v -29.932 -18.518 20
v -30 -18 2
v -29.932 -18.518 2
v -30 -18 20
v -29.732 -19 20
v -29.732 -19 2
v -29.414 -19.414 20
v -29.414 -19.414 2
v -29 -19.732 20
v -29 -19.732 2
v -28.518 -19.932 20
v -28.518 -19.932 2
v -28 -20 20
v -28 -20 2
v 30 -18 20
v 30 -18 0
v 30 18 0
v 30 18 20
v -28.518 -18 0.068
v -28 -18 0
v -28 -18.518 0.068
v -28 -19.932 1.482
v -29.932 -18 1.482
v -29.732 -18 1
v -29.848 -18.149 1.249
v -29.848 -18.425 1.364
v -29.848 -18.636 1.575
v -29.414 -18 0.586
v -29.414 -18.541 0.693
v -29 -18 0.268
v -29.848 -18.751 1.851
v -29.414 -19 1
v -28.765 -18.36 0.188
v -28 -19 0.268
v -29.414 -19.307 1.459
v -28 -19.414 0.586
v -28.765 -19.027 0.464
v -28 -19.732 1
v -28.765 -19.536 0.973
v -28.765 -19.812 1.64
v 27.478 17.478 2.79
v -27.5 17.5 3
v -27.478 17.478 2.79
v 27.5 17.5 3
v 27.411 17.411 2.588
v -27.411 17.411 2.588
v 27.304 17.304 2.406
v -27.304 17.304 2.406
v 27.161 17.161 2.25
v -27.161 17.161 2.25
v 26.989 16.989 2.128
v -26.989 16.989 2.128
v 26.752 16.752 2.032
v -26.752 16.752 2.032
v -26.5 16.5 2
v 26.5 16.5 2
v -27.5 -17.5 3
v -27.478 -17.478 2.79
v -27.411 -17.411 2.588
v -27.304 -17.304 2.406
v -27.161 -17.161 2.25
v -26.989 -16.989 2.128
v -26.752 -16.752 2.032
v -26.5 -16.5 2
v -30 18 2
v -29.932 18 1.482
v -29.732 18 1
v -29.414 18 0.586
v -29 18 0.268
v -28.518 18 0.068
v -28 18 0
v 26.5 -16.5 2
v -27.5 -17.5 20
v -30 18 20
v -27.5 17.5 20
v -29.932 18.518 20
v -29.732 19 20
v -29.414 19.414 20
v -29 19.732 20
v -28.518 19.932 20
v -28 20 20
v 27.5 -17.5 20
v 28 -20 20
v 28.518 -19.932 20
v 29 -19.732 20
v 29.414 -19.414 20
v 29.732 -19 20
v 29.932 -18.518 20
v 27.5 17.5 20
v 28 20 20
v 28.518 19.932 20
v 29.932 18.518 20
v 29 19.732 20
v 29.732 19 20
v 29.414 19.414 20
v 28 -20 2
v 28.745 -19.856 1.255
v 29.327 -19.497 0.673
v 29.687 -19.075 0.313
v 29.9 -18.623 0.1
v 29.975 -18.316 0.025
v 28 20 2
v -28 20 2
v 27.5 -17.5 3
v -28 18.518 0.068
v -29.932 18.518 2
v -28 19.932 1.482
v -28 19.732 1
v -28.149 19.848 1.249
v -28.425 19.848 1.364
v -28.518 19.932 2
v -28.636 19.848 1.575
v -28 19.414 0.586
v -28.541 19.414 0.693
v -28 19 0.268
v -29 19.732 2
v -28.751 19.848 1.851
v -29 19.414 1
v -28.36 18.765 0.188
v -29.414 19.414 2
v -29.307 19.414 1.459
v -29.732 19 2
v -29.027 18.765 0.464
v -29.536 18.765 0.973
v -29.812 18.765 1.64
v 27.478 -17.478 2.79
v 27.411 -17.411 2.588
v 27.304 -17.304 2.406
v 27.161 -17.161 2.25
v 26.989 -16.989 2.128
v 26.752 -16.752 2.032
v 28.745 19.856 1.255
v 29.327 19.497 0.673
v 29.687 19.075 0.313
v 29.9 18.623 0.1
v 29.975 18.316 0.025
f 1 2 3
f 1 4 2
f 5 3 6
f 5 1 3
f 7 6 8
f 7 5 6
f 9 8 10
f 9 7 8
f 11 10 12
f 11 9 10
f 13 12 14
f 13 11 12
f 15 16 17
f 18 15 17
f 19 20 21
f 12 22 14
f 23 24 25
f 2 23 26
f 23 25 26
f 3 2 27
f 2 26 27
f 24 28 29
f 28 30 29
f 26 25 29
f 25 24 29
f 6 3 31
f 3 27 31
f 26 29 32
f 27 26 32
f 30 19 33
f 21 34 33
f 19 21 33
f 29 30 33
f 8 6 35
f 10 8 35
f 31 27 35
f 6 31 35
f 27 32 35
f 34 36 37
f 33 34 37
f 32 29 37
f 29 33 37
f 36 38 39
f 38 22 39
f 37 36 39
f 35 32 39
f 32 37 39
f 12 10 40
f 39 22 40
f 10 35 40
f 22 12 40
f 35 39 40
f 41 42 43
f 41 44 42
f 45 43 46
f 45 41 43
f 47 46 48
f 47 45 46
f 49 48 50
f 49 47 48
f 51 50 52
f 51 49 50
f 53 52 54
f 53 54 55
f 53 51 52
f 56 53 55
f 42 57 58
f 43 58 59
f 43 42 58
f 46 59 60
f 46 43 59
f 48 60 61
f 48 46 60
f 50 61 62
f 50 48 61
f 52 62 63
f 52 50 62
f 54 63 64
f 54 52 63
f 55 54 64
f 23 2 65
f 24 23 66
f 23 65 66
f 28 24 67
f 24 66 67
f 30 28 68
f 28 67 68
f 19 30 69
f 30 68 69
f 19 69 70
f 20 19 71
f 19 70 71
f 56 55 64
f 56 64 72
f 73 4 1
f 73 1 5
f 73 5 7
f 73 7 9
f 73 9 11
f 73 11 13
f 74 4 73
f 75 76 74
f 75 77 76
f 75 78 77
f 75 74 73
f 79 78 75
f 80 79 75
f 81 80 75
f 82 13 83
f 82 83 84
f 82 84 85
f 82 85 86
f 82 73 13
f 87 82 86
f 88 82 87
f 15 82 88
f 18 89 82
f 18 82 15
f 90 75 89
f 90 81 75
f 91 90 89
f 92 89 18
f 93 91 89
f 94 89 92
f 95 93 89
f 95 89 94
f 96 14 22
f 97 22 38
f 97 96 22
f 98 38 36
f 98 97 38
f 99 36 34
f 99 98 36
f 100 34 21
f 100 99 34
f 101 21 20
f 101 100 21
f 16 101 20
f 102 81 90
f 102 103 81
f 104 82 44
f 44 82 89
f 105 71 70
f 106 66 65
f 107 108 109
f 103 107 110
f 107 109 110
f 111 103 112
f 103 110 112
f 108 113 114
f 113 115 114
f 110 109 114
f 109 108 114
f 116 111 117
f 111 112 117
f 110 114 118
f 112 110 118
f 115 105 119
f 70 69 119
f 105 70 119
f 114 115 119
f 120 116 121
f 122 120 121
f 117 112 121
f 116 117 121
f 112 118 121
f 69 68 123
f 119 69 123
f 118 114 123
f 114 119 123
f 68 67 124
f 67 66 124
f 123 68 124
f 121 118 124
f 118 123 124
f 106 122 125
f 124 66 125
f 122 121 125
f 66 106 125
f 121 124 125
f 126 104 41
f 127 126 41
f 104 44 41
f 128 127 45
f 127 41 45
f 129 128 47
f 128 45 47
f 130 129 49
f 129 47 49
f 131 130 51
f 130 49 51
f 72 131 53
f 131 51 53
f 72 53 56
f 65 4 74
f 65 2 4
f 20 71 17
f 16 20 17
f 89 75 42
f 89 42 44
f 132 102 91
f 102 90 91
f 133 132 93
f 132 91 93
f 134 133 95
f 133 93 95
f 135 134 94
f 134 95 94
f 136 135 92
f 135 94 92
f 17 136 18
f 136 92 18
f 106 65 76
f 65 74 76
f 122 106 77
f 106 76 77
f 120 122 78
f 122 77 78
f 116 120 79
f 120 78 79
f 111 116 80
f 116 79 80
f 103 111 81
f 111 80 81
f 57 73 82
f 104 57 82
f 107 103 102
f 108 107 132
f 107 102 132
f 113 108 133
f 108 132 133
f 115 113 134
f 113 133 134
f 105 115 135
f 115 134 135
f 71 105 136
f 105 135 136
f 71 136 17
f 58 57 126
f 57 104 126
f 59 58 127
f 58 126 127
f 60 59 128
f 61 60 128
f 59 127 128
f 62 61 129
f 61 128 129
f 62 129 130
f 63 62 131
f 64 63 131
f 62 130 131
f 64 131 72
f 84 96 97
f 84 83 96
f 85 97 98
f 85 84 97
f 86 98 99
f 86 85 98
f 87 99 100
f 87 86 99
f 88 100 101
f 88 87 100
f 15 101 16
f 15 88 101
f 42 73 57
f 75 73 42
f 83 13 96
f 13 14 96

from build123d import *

# Parameters (mm, degrees)
SKETCH1_W           = 60
SKETCH1_H           = 40
BOSS_EXTRUDE1_DEPTH = 20
SKETCH2_W           = 55
SKETCH2_H           = 35
CUT_EXTRUDE1_DEPTH  = 18
FILLET1_R           = 1
FILLET2_R           = 2


with BuildPart() as part:
    # Sketch1 → Boss-Extrude1 (new body)
    with BuildSketch(Plane.XY):
        Rectangle(SKETCH1_W, SKETCH1_H)
    extrude(amount=BOSS_EXTRUDE1_DEPTH)

    # Sketch2 → Cut-Extrude1 (cut)
    with BuildSketch(Plane.XY.offset(20)):
        Rectangle(SKETCH2_W, SKETCH2_H)
    extrude(amount=-CUT_EXTRUDE1_DEPTH, mode=Mode.SUBTRACT)

    # Fillet1
    fillet1_edges = [part.edges().sort_by_distance(p)[0] for p in [
        (27.5, 0, 2),
        (0, -17.5, 2),
        (-27.5, 0, 2),
        (0, 17.5, 2),
    ]]
    fillet(fillet1_edges, radius=FILLET1_R)

    # Fillet2
    fillet2_edges = [part.edges().sort_by_distance(p)[0] for p in [
        (0, -20, 0),
        (-30, 0, 0),
        (0, 20, 0),
        (30, -20, 10),
        (-30, -20, 10),
        (-30, 20, 10),
        (30, 20, 10),
    ]]
    fillet(fillet2_edges, radius=FILLET2_R)


solid = part.part
